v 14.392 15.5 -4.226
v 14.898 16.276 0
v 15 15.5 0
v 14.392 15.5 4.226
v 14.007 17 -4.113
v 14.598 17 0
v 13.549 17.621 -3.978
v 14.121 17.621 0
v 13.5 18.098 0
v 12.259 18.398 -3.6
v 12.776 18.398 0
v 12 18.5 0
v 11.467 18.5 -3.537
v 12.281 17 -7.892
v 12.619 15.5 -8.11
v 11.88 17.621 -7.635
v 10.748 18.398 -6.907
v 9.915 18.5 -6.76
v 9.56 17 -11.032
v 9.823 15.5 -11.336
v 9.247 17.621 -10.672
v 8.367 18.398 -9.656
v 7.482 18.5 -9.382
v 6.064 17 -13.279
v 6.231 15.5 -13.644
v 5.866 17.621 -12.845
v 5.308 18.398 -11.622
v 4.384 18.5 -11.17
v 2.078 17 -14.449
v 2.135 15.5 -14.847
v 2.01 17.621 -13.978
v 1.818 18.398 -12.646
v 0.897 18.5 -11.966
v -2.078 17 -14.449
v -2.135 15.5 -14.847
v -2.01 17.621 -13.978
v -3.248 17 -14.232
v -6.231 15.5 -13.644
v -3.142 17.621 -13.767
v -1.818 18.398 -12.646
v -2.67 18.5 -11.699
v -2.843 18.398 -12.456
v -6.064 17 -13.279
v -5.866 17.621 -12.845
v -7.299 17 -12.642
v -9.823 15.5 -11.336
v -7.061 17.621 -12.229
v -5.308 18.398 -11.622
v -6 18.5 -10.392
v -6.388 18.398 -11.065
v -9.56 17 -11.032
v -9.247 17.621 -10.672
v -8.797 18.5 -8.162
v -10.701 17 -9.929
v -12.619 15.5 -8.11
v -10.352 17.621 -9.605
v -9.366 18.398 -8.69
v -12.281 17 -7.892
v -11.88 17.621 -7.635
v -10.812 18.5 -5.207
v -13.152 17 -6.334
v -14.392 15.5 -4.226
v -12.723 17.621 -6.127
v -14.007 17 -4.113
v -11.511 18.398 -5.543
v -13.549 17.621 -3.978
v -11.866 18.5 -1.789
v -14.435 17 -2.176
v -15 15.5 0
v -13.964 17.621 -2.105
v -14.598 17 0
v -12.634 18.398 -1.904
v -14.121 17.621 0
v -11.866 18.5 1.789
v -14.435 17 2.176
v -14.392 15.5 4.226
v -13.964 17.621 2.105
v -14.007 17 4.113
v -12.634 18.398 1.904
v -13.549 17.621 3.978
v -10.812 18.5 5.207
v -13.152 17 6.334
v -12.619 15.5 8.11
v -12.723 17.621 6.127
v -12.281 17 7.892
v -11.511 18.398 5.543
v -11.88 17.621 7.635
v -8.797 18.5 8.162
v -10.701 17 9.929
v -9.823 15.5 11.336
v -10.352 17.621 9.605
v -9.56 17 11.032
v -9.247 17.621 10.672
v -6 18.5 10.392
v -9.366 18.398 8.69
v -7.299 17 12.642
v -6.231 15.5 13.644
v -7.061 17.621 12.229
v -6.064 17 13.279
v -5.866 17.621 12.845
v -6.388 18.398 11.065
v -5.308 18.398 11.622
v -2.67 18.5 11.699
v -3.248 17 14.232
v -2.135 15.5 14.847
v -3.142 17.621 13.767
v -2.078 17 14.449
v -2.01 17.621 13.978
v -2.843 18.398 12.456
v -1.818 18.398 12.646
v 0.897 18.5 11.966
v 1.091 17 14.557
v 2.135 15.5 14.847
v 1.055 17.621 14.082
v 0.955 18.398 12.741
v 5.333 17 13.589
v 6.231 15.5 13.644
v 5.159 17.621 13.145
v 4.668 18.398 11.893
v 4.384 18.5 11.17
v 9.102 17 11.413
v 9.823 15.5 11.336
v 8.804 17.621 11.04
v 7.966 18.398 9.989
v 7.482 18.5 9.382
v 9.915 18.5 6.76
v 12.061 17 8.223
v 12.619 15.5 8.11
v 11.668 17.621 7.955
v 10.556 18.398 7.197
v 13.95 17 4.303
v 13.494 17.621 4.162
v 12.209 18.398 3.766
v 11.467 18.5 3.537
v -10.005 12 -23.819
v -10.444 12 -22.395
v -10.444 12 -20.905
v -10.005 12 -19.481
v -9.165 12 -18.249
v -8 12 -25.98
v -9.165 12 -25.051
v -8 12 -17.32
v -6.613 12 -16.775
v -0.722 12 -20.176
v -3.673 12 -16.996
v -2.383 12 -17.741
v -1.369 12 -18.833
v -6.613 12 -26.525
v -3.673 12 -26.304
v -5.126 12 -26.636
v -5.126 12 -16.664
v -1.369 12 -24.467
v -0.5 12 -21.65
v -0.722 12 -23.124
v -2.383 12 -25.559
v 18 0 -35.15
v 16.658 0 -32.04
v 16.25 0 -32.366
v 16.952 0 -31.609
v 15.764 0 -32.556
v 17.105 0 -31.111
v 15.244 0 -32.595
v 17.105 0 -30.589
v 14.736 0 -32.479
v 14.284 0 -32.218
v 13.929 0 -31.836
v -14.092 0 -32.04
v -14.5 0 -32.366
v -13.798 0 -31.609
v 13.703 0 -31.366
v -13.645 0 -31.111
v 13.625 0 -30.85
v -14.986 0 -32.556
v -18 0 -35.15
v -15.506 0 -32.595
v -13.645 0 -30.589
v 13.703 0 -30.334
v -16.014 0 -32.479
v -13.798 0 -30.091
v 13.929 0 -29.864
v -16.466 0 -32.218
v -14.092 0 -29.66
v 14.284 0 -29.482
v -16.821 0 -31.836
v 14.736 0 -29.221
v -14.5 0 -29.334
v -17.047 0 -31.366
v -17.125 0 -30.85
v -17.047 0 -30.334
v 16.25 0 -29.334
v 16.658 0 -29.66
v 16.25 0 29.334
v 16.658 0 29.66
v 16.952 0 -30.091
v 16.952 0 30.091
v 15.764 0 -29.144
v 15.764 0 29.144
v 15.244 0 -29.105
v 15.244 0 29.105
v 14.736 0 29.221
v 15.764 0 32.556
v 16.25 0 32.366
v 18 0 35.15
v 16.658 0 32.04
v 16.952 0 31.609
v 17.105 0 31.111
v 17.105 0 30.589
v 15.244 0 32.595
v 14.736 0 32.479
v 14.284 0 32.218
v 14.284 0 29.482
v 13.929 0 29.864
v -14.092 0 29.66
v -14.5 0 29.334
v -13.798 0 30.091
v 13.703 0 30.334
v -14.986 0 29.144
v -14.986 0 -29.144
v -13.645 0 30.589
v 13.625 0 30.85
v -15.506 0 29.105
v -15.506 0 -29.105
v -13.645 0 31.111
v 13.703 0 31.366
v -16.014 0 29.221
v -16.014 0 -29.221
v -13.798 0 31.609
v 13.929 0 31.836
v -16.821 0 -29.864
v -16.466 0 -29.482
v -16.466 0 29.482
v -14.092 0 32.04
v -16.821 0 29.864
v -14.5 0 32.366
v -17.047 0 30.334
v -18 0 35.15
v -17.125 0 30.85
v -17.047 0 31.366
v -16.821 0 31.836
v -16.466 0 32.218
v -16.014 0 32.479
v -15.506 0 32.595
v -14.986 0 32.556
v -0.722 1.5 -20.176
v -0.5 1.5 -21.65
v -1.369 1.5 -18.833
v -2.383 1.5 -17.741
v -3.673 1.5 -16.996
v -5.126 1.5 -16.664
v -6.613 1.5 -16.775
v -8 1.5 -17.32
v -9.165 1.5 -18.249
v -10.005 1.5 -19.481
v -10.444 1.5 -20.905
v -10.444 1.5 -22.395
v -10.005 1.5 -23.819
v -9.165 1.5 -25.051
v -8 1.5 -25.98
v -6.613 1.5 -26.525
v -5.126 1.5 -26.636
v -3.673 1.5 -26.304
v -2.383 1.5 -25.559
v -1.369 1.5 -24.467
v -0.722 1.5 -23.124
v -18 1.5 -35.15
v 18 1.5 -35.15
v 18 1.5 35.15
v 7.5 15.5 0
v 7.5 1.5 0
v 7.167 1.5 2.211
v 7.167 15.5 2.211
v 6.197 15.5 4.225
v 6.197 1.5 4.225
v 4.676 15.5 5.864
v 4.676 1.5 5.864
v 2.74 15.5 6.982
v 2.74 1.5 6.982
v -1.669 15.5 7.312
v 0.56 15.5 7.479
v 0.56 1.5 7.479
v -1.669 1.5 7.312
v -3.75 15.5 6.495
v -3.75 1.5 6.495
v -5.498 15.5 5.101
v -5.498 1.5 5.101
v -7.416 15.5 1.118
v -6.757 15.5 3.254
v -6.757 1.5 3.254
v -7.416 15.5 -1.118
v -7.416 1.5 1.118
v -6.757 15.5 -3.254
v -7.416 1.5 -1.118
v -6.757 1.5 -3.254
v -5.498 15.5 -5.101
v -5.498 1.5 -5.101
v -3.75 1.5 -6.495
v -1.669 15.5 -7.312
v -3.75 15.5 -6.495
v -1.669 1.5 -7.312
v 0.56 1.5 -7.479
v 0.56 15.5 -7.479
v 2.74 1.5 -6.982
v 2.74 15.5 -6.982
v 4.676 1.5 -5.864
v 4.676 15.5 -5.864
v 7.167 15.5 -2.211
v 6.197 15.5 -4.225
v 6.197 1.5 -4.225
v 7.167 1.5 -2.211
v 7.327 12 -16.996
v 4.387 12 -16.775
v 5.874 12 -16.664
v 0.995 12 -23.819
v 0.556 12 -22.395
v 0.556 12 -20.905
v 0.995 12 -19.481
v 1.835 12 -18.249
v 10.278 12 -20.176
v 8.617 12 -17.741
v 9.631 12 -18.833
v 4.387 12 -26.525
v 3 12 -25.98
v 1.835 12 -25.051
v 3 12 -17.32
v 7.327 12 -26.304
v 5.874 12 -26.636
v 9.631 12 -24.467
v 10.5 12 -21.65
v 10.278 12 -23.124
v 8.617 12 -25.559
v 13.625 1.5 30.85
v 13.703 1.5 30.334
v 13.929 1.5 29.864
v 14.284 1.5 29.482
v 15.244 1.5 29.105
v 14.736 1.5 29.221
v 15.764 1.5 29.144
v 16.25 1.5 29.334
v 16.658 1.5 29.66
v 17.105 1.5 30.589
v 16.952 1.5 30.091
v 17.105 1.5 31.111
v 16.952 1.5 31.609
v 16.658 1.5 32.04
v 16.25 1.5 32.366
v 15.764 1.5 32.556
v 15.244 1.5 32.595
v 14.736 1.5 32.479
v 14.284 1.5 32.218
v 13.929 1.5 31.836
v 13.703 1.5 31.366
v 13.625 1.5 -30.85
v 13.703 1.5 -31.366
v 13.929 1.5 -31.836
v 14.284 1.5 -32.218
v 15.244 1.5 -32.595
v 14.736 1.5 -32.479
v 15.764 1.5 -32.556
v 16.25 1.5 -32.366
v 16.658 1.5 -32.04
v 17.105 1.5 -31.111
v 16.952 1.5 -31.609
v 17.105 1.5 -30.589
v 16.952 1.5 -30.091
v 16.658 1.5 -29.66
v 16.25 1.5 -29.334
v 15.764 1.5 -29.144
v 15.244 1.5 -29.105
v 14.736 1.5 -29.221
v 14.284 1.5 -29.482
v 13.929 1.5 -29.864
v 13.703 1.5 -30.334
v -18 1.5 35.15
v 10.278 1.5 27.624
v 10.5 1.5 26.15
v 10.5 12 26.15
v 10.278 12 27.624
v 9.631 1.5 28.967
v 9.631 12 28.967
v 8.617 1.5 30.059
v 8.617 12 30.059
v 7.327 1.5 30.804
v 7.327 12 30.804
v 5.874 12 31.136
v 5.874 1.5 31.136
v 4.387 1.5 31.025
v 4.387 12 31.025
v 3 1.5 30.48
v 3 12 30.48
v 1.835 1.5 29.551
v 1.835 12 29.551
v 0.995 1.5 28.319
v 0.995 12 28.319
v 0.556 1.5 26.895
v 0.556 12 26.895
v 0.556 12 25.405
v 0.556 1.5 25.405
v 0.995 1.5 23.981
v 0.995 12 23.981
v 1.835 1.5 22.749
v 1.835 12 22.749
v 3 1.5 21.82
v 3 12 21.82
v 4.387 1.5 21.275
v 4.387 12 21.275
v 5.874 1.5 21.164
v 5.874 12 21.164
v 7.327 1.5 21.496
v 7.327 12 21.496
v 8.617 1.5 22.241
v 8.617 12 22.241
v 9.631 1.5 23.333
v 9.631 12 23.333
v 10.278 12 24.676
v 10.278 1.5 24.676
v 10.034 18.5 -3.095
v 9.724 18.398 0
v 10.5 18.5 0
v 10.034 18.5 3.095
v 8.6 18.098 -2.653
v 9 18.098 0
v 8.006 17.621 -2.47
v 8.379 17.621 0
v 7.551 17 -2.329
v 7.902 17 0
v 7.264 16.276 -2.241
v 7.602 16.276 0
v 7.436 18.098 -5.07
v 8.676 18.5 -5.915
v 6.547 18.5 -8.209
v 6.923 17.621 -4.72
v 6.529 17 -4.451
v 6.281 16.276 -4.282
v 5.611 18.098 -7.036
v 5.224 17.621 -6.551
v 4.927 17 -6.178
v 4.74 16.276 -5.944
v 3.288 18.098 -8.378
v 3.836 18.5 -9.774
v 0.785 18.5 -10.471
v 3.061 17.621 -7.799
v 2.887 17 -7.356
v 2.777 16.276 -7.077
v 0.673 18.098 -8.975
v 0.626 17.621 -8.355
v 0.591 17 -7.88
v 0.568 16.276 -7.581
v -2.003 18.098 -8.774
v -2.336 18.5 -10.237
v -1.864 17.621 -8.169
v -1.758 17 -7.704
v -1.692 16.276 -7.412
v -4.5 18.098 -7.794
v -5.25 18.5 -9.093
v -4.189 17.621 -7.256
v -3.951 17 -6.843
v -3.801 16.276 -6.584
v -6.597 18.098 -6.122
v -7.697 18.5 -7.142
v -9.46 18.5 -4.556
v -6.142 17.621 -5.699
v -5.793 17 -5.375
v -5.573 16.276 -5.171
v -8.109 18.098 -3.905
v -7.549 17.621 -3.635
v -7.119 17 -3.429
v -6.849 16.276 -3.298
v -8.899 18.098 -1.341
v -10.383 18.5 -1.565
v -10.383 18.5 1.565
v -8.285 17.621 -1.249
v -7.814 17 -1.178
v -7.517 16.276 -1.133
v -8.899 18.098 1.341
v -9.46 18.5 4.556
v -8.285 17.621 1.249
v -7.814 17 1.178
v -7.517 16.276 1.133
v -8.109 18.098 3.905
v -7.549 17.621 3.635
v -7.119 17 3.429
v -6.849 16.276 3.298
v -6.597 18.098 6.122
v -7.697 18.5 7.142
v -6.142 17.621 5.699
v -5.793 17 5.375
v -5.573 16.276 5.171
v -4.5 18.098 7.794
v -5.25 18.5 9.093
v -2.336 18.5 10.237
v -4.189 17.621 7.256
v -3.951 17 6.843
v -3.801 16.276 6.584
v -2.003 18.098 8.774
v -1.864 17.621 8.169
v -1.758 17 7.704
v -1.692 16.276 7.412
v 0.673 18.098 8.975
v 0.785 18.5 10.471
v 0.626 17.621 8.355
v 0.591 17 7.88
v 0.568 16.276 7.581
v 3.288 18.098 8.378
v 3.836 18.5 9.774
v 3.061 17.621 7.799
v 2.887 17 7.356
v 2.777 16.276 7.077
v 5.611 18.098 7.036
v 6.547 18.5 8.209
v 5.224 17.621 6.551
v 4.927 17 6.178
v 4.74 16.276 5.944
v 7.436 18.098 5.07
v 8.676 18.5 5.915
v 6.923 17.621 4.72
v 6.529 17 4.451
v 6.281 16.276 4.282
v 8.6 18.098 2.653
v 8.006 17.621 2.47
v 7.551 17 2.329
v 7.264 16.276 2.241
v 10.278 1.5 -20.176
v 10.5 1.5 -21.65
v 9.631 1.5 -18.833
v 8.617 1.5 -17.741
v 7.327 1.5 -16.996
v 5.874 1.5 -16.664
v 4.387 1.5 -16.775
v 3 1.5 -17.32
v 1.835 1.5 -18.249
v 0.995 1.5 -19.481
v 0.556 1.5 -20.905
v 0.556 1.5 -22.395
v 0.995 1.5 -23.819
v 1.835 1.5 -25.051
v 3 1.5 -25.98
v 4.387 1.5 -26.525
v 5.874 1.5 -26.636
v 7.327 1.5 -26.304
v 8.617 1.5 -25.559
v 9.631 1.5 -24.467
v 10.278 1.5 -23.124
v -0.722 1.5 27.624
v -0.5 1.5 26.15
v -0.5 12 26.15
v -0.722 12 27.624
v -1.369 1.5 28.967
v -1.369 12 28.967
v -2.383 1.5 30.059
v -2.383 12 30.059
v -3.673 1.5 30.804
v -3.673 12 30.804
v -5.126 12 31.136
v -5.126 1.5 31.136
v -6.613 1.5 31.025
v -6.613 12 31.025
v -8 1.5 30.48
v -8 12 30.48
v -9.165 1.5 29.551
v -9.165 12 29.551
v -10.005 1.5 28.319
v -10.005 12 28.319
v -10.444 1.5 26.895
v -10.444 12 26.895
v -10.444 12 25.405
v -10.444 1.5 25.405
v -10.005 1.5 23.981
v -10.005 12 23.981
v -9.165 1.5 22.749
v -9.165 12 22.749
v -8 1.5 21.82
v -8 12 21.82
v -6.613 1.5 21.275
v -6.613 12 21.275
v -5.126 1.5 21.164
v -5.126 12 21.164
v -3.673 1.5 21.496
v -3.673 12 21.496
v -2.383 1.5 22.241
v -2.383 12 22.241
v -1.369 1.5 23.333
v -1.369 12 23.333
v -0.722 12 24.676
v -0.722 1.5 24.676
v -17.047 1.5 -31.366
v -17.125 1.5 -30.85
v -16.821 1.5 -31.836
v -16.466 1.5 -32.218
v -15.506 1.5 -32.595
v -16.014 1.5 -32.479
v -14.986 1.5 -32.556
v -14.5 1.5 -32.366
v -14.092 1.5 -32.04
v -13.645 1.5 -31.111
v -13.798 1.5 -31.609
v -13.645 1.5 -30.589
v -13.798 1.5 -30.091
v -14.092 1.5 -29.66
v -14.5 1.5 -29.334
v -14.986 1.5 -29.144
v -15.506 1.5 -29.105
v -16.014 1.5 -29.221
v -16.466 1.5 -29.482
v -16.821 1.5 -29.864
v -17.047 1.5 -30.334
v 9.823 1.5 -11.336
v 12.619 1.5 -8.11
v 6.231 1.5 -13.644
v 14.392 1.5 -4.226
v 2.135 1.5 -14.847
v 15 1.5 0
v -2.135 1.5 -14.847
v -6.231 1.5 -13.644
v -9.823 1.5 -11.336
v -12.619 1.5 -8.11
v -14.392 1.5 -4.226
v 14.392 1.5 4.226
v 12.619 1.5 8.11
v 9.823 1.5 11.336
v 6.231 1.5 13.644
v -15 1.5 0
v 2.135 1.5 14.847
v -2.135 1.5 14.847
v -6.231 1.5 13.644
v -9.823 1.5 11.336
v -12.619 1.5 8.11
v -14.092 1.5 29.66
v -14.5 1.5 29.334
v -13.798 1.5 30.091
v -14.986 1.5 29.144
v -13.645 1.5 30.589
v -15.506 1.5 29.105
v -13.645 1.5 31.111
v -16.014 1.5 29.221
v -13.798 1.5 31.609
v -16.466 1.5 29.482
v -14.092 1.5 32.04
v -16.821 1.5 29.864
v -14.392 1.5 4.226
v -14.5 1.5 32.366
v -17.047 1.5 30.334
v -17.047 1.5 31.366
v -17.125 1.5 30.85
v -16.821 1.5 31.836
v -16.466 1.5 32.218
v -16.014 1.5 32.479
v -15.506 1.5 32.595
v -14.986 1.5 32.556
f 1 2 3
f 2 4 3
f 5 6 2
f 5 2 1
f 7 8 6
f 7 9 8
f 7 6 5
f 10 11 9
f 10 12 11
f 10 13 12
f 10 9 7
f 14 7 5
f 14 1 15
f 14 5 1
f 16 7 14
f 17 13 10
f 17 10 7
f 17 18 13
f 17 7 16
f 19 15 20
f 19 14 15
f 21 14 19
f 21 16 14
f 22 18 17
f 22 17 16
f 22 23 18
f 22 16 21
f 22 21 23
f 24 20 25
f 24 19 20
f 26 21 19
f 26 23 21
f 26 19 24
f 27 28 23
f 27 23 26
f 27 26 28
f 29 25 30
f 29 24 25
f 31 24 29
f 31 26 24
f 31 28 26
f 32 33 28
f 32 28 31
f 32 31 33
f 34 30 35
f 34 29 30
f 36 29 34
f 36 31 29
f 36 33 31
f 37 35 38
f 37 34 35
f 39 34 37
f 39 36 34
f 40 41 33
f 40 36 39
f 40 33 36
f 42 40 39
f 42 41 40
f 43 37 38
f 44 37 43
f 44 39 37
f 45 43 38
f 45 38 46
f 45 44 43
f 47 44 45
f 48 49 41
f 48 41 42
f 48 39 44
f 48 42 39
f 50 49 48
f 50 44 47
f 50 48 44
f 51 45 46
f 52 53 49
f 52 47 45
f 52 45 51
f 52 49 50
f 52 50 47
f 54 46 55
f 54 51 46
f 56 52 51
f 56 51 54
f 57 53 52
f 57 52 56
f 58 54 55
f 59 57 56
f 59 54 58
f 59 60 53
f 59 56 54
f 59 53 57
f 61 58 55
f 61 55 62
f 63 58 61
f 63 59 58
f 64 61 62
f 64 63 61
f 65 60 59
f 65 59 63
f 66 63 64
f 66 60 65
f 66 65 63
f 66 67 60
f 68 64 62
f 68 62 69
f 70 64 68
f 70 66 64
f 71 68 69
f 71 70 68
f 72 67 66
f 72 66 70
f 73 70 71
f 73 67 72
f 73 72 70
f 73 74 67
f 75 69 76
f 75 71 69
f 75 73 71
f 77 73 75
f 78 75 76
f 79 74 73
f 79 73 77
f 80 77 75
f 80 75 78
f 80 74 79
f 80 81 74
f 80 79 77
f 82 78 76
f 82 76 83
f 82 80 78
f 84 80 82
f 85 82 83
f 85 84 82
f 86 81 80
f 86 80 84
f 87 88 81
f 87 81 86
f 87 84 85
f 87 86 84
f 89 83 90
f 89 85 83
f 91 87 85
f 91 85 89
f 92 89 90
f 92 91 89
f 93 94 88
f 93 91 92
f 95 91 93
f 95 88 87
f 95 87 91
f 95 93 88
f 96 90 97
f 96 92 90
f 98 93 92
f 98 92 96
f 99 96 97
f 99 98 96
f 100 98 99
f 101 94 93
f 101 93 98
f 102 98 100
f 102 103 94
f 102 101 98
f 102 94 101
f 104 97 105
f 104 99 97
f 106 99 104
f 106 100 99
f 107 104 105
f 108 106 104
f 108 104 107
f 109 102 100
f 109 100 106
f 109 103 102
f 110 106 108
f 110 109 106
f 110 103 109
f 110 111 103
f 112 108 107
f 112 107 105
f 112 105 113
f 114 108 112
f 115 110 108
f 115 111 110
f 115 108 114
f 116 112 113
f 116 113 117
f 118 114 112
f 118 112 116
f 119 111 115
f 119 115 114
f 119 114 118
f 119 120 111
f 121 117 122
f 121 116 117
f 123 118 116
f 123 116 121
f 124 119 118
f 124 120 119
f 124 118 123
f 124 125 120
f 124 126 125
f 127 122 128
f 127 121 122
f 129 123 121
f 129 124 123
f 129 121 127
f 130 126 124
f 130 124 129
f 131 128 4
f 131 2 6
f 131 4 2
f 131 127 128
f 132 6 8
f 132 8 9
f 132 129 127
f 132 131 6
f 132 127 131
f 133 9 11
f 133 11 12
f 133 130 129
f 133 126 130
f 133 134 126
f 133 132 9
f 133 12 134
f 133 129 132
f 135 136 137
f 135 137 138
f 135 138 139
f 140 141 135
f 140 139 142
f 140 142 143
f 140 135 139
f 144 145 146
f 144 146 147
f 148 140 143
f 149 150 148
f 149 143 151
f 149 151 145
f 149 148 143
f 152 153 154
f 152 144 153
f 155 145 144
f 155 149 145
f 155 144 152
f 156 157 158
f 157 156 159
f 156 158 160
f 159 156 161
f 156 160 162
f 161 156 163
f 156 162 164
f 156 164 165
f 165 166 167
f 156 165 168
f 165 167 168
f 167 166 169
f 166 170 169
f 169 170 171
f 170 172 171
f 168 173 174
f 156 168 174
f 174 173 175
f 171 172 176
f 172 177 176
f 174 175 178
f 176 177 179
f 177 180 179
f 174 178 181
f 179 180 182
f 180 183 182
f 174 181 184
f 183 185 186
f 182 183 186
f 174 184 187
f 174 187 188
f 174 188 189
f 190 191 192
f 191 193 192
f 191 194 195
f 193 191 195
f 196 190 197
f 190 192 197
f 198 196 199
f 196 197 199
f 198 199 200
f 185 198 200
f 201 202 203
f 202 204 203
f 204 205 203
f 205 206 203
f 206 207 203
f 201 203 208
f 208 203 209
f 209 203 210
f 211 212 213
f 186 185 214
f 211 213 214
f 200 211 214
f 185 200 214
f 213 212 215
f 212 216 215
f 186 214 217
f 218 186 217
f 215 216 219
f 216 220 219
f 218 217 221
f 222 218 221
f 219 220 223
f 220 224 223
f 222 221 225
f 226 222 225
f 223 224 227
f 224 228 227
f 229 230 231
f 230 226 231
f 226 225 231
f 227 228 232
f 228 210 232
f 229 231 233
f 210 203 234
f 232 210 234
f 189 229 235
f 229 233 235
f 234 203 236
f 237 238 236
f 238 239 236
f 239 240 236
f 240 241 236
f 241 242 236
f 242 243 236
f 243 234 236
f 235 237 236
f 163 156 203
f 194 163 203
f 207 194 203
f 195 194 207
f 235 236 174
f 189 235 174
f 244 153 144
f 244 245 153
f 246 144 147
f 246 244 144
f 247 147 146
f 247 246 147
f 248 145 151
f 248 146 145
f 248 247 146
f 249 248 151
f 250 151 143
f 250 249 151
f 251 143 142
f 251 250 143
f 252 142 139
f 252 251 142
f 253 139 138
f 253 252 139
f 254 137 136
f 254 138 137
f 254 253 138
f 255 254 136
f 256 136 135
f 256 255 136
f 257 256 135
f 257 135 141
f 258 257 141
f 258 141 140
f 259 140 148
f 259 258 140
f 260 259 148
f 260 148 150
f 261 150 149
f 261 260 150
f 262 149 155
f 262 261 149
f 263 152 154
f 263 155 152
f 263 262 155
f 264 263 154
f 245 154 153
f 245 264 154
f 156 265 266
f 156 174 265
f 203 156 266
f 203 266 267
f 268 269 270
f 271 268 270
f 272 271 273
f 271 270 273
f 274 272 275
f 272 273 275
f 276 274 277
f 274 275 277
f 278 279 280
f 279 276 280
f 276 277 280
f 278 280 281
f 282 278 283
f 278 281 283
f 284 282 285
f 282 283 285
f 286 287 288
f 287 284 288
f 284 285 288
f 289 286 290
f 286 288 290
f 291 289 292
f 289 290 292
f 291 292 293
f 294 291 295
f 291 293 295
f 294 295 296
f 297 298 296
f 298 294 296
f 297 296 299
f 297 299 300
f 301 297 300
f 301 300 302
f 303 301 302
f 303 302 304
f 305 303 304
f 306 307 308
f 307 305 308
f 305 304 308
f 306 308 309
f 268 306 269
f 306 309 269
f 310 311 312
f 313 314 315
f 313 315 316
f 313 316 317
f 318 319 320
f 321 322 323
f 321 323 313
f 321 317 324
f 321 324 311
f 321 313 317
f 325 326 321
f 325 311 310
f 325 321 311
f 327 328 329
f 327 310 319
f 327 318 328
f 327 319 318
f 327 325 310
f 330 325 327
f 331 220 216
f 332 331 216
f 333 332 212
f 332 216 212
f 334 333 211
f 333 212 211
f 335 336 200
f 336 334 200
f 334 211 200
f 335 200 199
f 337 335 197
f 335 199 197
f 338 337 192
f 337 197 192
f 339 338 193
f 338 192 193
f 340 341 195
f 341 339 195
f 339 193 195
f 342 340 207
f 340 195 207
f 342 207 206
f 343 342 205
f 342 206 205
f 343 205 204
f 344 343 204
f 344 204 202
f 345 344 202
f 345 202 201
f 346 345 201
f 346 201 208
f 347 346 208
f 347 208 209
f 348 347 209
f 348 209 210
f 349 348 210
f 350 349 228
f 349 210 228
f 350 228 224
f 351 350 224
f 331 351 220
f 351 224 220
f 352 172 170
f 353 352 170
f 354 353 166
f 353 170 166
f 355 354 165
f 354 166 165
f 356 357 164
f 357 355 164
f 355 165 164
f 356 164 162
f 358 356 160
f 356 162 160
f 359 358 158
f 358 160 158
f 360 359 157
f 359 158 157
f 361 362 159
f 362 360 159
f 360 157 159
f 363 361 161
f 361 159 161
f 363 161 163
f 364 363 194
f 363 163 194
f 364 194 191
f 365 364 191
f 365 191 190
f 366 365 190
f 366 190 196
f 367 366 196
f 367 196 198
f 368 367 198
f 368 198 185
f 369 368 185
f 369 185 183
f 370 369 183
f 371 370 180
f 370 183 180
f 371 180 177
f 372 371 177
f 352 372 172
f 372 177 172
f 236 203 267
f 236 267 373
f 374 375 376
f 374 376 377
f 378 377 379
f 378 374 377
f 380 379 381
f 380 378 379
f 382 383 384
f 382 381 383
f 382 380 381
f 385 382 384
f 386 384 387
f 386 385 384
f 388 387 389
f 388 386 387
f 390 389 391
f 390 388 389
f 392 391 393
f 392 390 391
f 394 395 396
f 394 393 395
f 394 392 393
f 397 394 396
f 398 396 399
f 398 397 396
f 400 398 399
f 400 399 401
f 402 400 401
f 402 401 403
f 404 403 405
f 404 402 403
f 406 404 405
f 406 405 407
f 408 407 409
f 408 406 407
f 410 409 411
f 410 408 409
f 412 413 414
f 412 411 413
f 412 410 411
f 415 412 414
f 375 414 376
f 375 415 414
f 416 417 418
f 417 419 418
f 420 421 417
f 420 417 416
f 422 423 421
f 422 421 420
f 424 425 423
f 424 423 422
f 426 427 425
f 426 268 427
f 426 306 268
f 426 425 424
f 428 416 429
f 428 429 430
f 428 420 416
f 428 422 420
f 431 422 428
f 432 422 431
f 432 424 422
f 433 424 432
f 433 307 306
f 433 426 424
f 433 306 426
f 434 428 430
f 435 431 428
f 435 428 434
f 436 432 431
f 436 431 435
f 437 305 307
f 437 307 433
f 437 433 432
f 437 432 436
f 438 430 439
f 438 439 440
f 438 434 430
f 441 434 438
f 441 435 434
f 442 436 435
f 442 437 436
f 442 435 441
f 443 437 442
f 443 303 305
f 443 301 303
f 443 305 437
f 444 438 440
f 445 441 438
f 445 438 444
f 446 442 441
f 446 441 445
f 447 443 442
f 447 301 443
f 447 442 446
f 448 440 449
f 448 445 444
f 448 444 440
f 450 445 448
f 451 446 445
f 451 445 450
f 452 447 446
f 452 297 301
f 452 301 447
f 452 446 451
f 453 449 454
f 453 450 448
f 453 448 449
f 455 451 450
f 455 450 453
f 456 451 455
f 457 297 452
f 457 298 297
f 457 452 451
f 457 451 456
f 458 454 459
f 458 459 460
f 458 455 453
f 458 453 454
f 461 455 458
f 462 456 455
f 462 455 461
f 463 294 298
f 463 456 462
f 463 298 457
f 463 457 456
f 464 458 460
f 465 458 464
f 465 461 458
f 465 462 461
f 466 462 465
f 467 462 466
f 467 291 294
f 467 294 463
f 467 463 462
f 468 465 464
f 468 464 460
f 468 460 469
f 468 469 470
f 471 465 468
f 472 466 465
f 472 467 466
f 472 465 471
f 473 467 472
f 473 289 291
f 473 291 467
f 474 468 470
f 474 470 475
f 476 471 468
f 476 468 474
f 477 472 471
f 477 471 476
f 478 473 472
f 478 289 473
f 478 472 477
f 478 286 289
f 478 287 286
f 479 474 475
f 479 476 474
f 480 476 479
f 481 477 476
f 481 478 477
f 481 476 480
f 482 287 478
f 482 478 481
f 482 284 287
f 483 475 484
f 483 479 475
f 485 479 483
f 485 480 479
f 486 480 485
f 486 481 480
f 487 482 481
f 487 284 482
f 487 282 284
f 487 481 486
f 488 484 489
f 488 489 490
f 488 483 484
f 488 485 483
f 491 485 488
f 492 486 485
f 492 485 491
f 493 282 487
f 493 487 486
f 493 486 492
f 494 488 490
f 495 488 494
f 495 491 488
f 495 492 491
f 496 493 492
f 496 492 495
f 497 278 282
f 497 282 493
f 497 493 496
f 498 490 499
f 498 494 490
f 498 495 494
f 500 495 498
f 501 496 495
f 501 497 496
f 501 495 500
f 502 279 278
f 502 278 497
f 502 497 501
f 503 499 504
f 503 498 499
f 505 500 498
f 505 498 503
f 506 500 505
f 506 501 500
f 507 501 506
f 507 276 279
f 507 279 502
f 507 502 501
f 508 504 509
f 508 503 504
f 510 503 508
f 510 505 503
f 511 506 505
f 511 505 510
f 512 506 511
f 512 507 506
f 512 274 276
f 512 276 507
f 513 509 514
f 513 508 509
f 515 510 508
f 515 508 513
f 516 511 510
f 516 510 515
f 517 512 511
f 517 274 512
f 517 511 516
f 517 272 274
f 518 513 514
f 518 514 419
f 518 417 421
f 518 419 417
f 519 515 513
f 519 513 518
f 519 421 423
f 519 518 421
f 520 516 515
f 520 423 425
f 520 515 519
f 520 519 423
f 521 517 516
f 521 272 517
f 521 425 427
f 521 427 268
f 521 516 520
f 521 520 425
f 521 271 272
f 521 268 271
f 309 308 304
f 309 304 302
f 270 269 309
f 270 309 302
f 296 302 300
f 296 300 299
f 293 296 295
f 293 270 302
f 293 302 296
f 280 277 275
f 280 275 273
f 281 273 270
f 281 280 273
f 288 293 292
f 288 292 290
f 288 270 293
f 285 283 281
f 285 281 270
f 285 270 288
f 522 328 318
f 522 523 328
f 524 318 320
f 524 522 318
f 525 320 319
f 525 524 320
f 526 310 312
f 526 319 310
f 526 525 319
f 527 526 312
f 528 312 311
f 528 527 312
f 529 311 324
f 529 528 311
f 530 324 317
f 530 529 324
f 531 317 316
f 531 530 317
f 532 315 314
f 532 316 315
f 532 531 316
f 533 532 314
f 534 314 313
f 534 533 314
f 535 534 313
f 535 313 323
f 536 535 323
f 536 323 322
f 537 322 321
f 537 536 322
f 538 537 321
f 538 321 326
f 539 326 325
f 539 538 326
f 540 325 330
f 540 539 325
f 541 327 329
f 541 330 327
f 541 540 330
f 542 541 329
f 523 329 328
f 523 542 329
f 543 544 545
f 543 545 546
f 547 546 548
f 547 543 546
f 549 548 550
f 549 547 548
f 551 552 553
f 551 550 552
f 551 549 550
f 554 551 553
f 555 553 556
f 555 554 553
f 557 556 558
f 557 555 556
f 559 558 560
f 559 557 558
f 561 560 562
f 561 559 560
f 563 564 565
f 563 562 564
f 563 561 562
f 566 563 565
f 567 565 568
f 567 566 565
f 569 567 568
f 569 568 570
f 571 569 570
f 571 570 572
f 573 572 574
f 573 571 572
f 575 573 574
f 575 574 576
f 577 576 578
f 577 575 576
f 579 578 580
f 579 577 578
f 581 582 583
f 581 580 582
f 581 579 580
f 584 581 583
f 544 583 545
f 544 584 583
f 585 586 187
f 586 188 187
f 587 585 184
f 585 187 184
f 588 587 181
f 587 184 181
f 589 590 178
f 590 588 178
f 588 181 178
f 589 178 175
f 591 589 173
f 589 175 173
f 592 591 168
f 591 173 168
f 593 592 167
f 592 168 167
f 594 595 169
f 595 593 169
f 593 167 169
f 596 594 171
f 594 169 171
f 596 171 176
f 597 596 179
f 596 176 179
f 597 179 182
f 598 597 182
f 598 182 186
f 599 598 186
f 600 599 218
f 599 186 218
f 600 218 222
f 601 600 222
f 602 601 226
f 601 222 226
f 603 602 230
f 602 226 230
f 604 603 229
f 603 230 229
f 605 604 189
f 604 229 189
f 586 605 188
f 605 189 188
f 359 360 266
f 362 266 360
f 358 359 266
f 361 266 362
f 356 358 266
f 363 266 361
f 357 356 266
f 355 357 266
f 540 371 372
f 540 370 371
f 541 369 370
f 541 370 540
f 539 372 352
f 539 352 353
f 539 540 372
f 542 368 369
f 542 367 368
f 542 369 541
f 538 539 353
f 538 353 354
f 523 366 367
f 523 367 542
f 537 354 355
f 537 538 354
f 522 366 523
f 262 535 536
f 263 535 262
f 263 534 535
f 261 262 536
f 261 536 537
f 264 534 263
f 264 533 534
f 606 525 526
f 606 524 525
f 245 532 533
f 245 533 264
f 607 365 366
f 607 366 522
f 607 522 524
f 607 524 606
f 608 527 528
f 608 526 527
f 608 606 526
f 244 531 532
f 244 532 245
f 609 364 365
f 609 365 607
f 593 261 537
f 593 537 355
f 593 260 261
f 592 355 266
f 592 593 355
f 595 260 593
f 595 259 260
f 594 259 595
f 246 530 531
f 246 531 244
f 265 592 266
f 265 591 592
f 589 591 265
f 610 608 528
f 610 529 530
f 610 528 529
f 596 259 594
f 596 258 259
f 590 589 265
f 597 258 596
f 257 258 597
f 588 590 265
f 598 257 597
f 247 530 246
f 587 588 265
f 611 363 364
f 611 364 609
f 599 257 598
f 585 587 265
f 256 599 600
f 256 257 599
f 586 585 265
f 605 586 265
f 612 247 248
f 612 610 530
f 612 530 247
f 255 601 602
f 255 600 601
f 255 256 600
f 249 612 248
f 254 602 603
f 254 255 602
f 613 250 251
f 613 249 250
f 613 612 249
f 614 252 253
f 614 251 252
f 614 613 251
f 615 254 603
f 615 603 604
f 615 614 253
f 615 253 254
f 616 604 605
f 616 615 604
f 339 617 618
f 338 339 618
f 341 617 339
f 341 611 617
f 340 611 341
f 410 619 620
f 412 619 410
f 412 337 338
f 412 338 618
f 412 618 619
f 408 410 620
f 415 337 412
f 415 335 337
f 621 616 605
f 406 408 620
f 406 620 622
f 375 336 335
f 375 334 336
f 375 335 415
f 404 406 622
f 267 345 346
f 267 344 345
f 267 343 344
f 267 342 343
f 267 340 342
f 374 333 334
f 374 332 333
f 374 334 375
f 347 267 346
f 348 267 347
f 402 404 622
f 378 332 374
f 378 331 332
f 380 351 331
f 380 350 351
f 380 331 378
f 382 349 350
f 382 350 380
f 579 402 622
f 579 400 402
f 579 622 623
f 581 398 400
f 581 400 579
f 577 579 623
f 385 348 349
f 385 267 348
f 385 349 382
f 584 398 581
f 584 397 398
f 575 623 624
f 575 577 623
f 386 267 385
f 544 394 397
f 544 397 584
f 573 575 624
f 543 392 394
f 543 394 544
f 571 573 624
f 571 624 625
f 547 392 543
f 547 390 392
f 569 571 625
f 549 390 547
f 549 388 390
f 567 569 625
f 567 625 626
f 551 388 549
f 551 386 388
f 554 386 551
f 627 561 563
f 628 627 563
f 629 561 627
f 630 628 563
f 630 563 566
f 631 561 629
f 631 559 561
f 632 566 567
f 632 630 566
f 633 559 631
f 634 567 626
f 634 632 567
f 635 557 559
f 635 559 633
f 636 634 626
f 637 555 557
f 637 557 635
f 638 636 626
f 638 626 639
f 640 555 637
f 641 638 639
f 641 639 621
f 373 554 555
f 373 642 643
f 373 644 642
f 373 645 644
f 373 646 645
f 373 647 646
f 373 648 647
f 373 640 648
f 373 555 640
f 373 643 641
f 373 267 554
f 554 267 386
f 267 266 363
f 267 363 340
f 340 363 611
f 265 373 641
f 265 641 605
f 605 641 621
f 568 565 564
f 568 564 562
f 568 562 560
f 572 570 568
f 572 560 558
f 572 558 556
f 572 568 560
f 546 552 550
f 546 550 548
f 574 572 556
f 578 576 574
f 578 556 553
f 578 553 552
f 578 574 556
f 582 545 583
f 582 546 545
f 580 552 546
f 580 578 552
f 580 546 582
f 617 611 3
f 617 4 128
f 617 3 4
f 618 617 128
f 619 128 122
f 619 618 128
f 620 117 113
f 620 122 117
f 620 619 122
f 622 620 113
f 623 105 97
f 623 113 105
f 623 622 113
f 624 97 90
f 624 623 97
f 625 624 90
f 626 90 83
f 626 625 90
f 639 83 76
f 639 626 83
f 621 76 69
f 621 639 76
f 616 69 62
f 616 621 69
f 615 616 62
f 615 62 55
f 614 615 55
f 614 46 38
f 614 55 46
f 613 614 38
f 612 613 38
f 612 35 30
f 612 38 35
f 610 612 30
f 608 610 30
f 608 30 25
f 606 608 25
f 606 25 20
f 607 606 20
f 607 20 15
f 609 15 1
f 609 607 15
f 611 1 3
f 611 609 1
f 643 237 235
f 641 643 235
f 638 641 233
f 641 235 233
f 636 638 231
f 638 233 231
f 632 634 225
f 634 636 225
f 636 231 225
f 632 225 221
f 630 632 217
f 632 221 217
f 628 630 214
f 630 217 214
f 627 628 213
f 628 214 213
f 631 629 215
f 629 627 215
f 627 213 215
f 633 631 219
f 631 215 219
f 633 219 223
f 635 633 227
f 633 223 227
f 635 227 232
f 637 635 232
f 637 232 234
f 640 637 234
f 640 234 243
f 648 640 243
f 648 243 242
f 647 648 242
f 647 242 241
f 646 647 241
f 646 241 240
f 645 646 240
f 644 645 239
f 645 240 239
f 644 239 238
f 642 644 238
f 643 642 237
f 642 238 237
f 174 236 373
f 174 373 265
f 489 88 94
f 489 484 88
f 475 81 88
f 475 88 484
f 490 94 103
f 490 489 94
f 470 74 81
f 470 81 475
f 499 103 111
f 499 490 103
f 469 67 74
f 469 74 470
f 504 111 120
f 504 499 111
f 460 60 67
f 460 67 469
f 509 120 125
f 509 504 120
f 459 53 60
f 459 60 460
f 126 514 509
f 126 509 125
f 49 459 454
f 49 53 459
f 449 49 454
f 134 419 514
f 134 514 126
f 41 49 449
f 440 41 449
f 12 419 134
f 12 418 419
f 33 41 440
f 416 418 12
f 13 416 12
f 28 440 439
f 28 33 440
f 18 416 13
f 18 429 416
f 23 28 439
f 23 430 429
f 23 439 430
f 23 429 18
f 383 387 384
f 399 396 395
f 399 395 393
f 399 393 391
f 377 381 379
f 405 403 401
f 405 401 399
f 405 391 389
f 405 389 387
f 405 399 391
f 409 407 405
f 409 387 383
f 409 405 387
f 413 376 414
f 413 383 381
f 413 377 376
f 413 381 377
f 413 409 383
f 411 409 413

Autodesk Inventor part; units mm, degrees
ref_plane "YZ Plane" through (0, 0, 0) normal (1, 0, 0) x (0, 1, 0)
ref_plane "XZ Plane" through (0, 0, 0) normal (0, 1, 0) x (-1, 0, 0)
sketch "Эскиз1" plane through (0, 0, 0) normal (0, 1, 0) x (-1, 0, 0)
  line L0 (18, -35.15) -> (-18, -35.15)
  line L1 (-18, -35.15) -> (-18, 35.15)
  line L2 (-18, 35.15) -> (18, 35.15)
  line L3 (18, 35.15) -> (18, -35.15)
  line L4 (18, -35.15) -> (-18, 35.15) construction
  line L5 (-18, -35.15) -> (18, 35.15) construction
  line L6 (15.375, -30.85) -> (-15.375, -30.85) construction
  line L7 (-15.375, -30.85) -> (-15.375, 30.85) construction
  line L8 (-15.375, 30.85) -> (15.375, 30.85) construction
  line L9 (15.375, 30.85) -> (15.375, -30.85) construction
  line L10 (15.375, -30.85) -> (-15.375, 30.85) construction
  line L11 (-15.375, -30.85) -> (15.375, 30.85) construction
  circle A0 centre (15.375, -30.85) radius 1.75
  line L12 (0, 0) -> (0, -35.15) construction
  line L13 (18, 0) -> (-18, 0) construction
  line L14 (15.375, -30.85) -> (-15.375, 30.85) construction
  circle A1 centre (-15.375, -30.85) radius 1.75
  line L15 (-18, 0) -> (18, 0) construction
  circle A2 centre (15.375, 30.85) radius 1.75
  circle A3 centre (-15.375, 30.85) radius 1.75
  point P0 (0, 0)
  dimension "d0" = 36
  dimension "d1" = 70.3
  dimension "d2" = 30.75
  dimension "d3" = 61.7
  dimension "d4" = 3.5
extrude "Выдавливание1" add sketch "Эскиз1" along normal blind 1.5
sketch "Эскиз2" plane through (0, 1.5, 0) normal (0, 1, 0) x (1, 0, 0)
  circle A0 centre (0, 0) radius 15
  circle A1 centre (0, 0) radius 7.5
  dimension "d7" = 30
  dimension "d8" = 15
extrude "Выдавливание2" add sketch "Эскиз2" along normal blind 17
sketch "Эскиз4" plane through (0, 1.5, 0) normal (0, 1, 0) x (1, 0, 0)
  circle A0 centre (-5.5, -26.15) radius 5
  line L0 (-18, -35.15) -> (18, -35.15) projected
  circle A1 centre (5.5, -26.15) radius 5
  line L1 (-18, 35.15) -> (-18, -35.15) projected
  line L2 (-18, 35.15) -> (-18, -35.15) construction
  line L3 (-18, 0) -> (18, 0) construction
  line L4 (18, -35.15) -> (18, 35.15) construction
  circle A2 centre (-5.5, 21.65) radius 5
  circle A3 centre (5.5, 21.65) radius 5
  line L5 (18, 35.15) -> (-18, 35.15) projected
  point P0 (0, 0)
  dimension "d11" = 10
  dimension "d12" = 9
  dimension "d13" = 10
  dimension "d14" = 9
  dimension "d15" = 11
  dimension "d16" = 12.5
  dimension "d19" = 10
  dimension "d20" = 10
  dimension "d21" = 13.5
  dimension "d22" = 13.5
  dimension "d23" = 11
  dimension "d24" = 12.5
extrude "Выдавливание3" add sketch "Эскиз4" along normal blind 10.5
ref_plane "РабПлоскость1" through (-18, 0, 0) normal (0, 0, 1) x (1, 0, 0)
fillet "Сопряжение1" radius 3 2 edges at (-15, 18.5, 0) (-7.5, 18.5, 0)
properties part number "a1401220"
